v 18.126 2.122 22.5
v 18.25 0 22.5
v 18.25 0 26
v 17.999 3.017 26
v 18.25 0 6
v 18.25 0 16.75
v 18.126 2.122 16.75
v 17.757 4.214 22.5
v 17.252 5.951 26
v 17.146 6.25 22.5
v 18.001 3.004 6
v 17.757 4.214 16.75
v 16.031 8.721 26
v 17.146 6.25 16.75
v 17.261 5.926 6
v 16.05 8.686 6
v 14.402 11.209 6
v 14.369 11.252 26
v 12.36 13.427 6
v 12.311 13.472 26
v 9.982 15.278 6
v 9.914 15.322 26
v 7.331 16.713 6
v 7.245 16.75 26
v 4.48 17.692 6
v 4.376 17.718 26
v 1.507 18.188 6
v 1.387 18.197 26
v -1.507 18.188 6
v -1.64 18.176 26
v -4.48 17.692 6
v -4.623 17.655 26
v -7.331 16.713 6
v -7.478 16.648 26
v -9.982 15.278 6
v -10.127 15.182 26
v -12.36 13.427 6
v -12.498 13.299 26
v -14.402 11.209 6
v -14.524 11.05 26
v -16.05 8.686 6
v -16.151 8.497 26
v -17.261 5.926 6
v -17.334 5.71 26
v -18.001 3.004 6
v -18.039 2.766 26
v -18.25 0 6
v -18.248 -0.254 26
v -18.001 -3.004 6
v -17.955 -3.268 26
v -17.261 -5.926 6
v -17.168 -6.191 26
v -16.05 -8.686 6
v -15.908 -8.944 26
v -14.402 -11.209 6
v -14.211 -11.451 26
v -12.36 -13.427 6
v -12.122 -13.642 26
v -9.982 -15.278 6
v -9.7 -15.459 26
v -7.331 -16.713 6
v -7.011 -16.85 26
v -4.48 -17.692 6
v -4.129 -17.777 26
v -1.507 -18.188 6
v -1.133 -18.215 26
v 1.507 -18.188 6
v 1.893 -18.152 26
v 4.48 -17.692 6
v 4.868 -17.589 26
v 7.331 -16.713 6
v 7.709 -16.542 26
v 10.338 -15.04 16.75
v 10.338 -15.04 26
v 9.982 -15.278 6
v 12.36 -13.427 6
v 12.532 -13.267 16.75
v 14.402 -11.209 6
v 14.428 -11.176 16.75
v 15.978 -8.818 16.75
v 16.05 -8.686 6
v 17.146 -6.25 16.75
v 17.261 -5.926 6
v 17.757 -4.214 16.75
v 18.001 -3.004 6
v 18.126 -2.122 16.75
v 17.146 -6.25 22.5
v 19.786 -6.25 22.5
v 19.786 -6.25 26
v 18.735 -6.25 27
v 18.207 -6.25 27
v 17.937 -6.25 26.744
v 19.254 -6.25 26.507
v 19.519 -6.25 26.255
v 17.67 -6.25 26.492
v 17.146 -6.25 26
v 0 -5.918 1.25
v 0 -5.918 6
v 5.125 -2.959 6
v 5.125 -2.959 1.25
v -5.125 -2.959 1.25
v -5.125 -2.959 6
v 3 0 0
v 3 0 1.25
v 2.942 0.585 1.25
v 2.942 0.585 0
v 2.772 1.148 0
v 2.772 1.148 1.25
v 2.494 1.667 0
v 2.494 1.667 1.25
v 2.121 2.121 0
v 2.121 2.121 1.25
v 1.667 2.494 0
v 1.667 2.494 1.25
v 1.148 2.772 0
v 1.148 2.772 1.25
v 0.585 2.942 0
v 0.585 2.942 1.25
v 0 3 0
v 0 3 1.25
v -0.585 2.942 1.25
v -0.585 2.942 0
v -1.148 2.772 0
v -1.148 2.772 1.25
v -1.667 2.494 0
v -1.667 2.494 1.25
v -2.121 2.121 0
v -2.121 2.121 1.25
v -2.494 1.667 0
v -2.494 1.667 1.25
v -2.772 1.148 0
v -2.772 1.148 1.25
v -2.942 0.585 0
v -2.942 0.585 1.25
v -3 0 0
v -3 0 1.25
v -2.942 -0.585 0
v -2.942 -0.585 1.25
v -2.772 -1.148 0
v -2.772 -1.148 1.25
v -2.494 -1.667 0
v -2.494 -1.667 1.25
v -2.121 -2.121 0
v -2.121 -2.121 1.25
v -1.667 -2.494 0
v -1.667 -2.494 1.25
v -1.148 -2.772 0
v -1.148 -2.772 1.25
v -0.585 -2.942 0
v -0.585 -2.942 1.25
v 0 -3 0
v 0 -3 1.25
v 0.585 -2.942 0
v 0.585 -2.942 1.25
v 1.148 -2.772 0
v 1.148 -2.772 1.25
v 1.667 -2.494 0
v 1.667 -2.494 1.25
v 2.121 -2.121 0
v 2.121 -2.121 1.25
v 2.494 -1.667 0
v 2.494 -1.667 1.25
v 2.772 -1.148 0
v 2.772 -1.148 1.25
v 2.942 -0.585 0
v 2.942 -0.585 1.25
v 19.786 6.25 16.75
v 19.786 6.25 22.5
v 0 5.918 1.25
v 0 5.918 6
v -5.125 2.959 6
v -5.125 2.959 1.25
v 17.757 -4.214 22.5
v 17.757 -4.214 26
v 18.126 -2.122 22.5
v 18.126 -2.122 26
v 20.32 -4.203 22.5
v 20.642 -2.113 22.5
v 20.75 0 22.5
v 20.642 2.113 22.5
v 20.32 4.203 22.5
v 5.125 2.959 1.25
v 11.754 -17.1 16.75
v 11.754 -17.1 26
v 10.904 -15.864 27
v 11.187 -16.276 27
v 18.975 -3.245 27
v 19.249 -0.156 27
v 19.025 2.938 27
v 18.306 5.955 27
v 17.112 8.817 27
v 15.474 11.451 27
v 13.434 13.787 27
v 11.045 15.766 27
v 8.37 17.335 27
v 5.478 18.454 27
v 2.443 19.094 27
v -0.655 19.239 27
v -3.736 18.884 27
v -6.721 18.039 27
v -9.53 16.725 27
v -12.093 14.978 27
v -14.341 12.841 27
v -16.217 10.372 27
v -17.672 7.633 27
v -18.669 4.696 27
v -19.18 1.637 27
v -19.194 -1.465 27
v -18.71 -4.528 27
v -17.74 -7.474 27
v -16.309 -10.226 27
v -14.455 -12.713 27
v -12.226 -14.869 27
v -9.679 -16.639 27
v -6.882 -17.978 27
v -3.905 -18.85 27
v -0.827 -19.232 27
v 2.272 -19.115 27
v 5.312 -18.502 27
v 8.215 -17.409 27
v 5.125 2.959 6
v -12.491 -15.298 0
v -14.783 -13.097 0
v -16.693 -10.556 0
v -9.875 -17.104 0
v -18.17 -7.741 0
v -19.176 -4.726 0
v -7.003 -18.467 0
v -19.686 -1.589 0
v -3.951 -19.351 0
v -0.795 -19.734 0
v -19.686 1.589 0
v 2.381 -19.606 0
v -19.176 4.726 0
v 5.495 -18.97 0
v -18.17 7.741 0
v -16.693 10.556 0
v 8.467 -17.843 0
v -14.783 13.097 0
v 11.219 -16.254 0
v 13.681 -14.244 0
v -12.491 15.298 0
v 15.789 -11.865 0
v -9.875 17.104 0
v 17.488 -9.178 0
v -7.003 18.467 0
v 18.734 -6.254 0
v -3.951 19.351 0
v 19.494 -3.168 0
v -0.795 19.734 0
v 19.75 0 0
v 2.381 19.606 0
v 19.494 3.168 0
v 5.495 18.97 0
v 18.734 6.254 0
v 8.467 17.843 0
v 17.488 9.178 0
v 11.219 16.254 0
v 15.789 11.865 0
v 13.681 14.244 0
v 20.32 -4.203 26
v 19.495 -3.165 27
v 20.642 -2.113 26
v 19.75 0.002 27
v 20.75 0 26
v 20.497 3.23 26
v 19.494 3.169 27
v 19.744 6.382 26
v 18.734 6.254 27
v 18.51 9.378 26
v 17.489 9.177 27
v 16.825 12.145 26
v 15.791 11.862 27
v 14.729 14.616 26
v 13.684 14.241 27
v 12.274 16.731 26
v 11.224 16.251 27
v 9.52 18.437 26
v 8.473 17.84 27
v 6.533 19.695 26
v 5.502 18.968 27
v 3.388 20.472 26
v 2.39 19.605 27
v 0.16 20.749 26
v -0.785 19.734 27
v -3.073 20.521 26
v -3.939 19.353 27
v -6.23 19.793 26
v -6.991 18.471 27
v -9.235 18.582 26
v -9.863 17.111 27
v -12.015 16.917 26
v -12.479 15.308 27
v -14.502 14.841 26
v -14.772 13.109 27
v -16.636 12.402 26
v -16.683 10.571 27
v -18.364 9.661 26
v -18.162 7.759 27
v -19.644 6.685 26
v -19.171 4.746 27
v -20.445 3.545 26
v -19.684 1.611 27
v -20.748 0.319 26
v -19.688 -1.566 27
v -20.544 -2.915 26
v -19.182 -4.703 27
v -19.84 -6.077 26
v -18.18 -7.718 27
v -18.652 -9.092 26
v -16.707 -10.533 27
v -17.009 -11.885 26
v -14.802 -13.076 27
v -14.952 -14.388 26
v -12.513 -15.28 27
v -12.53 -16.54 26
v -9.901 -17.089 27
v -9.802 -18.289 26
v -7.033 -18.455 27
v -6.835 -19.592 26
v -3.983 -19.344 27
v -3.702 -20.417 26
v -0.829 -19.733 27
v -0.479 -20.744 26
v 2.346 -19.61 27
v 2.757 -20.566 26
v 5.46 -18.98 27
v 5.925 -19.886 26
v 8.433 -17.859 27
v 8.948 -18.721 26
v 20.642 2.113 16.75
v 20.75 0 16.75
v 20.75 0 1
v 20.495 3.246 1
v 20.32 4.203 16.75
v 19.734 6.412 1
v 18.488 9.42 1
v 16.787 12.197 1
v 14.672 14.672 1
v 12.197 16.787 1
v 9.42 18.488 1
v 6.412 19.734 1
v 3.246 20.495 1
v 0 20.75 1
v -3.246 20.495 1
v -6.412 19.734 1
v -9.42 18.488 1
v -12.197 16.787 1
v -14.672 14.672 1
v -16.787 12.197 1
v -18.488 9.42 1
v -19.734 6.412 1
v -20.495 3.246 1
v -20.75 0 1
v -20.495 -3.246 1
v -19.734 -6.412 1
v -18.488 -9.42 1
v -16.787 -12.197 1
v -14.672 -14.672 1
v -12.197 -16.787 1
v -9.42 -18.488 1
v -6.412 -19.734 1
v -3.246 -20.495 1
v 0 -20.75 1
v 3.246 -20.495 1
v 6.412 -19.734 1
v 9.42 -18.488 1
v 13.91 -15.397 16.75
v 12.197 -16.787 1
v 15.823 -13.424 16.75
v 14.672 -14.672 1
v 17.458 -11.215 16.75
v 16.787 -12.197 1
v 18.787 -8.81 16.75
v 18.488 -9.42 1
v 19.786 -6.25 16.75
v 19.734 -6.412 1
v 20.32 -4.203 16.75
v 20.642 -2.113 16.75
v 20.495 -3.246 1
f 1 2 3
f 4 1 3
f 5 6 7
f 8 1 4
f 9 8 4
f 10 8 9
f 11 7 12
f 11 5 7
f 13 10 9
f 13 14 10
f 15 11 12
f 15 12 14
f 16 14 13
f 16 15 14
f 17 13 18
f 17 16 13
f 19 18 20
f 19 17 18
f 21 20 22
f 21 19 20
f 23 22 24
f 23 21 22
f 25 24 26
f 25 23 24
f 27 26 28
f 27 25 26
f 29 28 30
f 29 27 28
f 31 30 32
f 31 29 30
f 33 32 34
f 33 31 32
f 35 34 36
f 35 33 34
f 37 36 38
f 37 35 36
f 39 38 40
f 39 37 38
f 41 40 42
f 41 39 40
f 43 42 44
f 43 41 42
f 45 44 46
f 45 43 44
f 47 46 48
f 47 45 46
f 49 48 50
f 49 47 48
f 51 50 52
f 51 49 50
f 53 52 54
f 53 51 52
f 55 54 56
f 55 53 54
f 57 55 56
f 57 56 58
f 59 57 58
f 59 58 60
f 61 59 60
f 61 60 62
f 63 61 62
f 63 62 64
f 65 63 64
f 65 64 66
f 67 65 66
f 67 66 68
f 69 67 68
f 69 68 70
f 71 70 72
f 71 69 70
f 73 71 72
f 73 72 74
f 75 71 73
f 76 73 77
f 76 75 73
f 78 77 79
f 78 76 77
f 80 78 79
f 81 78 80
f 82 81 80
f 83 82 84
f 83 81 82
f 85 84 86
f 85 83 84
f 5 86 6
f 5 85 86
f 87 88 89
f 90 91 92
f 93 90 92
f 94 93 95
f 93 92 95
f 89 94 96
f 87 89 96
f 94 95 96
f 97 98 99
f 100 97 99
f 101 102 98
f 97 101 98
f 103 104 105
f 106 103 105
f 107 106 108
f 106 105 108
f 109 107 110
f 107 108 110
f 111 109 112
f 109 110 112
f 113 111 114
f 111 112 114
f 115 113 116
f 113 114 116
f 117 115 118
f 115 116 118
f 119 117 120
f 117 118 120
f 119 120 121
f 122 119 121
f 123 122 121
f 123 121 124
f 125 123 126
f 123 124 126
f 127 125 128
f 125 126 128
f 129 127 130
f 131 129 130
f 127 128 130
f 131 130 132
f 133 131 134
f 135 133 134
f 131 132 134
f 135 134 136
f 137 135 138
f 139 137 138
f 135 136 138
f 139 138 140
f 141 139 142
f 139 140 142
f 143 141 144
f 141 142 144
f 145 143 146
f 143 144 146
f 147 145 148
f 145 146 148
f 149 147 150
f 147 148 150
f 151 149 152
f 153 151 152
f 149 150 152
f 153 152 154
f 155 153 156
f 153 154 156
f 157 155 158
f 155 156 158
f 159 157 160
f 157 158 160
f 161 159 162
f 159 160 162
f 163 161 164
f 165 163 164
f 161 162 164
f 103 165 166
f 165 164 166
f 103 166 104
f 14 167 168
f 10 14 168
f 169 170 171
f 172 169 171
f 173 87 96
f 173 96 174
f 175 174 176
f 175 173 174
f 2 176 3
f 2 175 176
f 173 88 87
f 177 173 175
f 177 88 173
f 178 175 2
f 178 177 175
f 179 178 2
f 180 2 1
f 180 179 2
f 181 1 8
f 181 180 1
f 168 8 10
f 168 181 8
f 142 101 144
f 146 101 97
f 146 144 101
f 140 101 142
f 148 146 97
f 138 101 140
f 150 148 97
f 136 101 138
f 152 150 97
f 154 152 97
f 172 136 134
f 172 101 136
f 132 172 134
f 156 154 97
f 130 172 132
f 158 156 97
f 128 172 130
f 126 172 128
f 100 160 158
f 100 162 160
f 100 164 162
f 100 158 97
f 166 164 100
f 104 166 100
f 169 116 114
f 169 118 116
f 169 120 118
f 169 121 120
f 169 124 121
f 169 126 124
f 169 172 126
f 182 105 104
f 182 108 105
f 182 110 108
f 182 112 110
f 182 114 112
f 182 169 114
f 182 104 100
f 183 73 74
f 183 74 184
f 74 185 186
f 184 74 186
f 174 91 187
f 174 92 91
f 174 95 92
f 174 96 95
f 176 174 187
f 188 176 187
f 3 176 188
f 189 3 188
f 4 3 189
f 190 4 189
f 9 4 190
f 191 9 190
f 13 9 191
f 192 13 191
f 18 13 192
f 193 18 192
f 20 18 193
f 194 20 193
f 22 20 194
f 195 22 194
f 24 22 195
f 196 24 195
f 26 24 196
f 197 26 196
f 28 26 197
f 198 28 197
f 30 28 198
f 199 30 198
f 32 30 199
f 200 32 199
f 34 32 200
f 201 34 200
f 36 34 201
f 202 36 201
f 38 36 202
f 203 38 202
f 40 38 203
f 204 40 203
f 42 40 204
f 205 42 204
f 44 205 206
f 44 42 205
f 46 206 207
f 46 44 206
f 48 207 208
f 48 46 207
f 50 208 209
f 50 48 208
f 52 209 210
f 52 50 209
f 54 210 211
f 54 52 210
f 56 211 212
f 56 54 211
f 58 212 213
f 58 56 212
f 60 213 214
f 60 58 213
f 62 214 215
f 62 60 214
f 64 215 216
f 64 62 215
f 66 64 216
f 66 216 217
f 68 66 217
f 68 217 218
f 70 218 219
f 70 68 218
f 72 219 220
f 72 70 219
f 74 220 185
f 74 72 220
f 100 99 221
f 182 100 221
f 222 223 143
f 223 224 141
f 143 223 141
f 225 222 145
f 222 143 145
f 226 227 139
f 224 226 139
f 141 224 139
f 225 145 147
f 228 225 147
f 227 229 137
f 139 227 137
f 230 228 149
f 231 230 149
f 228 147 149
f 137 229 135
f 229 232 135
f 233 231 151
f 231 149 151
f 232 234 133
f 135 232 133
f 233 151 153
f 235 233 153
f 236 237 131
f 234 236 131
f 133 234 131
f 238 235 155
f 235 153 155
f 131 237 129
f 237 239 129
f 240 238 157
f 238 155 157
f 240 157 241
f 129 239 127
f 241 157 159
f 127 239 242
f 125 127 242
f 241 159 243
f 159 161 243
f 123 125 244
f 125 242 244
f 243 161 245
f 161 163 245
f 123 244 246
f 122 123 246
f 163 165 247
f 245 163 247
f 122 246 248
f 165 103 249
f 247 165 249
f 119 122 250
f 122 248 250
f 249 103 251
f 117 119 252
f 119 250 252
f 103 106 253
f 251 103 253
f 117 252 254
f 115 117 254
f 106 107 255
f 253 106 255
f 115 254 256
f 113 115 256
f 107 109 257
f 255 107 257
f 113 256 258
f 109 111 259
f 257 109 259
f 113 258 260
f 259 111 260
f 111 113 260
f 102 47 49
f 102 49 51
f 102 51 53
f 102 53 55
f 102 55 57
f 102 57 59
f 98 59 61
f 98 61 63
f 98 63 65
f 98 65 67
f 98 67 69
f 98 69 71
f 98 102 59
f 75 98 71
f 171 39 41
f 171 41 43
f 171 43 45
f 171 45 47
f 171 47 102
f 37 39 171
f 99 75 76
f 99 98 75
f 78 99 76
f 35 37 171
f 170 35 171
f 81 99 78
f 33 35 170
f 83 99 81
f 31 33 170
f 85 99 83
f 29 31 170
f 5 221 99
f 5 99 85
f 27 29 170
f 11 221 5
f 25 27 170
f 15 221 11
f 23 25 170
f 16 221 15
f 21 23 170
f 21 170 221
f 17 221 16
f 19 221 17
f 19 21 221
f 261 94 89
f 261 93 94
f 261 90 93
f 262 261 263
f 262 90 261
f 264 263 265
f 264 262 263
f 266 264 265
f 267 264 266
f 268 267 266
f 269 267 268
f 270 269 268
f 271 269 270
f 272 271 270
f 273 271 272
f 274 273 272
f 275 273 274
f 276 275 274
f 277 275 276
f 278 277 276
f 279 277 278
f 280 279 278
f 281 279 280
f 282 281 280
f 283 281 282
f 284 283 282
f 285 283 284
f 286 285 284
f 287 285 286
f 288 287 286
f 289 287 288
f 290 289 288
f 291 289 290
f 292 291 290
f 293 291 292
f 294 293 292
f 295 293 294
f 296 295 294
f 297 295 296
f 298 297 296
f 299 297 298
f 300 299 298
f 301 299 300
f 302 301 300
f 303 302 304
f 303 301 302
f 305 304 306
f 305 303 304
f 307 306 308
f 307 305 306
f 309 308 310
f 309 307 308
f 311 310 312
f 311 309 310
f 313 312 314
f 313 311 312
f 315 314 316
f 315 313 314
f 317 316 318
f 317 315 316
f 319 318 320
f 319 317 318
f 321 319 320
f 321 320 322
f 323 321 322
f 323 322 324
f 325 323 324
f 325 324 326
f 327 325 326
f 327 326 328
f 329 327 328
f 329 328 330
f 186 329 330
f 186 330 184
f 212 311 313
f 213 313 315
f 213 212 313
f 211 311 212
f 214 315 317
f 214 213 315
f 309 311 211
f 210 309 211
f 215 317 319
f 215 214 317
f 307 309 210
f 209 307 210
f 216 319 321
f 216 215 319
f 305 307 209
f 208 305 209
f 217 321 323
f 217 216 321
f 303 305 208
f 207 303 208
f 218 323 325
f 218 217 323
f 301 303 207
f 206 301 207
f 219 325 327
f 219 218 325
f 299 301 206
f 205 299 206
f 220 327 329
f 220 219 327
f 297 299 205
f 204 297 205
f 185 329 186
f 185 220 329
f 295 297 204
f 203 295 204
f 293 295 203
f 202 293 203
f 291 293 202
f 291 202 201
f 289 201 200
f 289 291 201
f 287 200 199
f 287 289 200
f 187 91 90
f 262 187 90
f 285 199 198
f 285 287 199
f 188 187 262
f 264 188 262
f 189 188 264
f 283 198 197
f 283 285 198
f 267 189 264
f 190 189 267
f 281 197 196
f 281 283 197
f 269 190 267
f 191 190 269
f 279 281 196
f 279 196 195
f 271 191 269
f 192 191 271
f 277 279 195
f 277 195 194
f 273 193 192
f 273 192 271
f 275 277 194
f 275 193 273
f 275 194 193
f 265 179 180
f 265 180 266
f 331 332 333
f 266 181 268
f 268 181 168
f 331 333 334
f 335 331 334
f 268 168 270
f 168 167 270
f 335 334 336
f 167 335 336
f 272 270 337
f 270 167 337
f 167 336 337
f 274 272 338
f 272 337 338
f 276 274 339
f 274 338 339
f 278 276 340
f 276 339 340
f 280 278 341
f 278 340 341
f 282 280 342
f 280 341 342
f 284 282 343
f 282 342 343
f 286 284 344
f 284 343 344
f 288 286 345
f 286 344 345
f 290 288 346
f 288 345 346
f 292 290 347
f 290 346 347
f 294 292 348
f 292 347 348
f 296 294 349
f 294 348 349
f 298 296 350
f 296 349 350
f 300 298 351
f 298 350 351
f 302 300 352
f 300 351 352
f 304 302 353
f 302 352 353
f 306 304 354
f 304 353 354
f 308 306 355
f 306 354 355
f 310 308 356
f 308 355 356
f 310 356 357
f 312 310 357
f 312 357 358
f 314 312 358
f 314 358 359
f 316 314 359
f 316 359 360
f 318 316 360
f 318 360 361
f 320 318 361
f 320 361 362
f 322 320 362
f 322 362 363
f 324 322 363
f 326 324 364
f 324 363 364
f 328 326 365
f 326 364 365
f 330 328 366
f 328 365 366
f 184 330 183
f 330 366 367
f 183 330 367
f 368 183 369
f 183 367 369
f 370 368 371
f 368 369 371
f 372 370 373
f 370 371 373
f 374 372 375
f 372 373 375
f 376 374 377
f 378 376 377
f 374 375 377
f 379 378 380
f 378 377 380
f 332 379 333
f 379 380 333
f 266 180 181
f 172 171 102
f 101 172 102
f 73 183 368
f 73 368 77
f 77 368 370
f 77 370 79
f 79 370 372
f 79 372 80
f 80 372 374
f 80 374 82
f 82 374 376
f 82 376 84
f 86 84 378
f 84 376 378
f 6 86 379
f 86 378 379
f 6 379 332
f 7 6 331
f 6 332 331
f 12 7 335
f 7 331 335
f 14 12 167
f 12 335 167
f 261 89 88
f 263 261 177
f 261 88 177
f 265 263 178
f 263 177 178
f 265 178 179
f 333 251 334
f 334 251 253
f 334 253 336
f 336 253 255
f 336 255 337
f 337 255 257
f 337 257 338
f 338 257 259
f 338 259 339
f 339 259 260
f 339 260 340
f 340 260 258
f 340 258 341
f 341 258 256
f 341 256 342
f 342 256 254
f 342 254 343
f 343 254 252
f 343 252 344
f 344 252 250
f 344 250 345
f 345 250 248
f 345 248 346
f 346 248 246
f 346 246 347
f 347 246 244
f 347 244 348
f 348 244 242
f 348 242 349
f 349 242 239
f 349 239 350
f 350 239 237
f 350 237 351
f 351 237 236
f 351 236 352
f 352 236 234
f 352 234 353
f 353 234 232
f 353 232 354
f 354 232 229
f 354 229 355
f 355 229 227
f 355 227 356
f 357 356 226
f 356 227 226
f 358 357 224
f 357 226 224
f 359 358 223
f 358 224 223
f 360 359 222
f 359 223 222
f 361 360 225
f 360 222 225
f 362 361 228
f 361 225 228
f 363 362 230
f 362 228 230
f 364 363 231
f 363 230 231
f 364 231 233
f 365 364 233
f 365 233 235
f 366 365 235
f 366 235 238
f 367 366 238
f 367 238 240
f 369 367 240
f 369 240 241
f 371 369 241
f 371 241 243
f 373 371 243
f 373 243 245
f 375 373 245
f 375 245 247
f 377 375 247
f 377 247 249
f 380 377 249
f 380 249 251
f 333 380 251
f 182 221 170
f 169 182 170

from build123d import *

# Parameters (mm, degrees)
F0_R      = 20.75
F1_DEPTH  = 6
F3_DEPTH  = 4.75
F4_R      = 3
F5_DEPTH  = 1.25
F6_R      = 20.75
F6_R_2    = 18.25
F7_DEPTH  = 21
F9_W      = 12.5
F9_H      = 5.75
F10_DEPTH = 4.6035718005
F12_DEPTH = 10.25
F13_SIZE  = 1


with BuildPart() as f1:
    # F0 (on Top) → F1 (new body)
    with BuildSketch(Plane.XY):
        Circle(F0_R)
    extrude(amount=F1_DEPTH)

    # F2 (on face) → F3 (cut)
    with BuildSketch(Plane.XY.offset(6)):
        Polygon((5.125, -2.9589201296), (5.125, 2.9589201296), (0, 5.9178402592), (-5.125, 2.9589201296), (-5.125, -2.9589201296), (0, -5.9178402592), align=None)
    extrude(amount=-F3_DEPTH, mode=Mode.SUBTRACT)

    # F4 (on face) → F5 (cut, through all)
    with BuildSketch(Plane.XY.offset(1.25)):
        Circle(F4_R)
    extrude(amount=-F5_DEPTH, mode=Mode.SUBTRACT)

    # F6 (on face) → F7 (join)
    with BuildSketch(Plane.XY.offset(6)):
        Circle(F6_R)
        Circle(F6_R_2, mode=Mode.SUBTRACT)
    extrude(amount=F7_DEPTH)

    # F9 (on offset) → F10 (cut, up to face)
    with BuildSketch(Plane.YZ.offset(20.75)):
        with Locations((0, 19.625)):
            Rectangle(F9_W, F9_H)
    extrude(amount=-F10_DEPTH, mode=Mode.SUBTRACT)

    # F11 (on face) → F12 (cut, through all)
    with BuildSketch(Plane.XY.offset(27)):
        with BuildLine():
            Line((10.3375358146, -15.039875441), (11.7536366111, -17.1001323508))
            ThreePointArc((11.7536366111, -17.1001323508), (16.6770552799, -12.3465917237), (19.7863589374, -6.25))
            Line((19.7863589374, -6.25), (17.1464281995, -6.25))
            ThreePointArc((17.1464281995, -6.25), (14.4276660292, -11.1760884459), (10.3375358146, -15.039875441))
        make_face()
    extrude(amount=-F12_DEPTH, mode=Mode.SUBTRACT)

    # F13
    f13_edges = [f1.edges().sort_by_distance(p)[0] for p in [
        (-18.363693, 9.661122, 27),
        (-16.1512, 8.497131, 27),
        (-20.75, 0, 0),
    ]]
    chamfer(f13_edges, length=F13_SIZE)


solid = f1.part
